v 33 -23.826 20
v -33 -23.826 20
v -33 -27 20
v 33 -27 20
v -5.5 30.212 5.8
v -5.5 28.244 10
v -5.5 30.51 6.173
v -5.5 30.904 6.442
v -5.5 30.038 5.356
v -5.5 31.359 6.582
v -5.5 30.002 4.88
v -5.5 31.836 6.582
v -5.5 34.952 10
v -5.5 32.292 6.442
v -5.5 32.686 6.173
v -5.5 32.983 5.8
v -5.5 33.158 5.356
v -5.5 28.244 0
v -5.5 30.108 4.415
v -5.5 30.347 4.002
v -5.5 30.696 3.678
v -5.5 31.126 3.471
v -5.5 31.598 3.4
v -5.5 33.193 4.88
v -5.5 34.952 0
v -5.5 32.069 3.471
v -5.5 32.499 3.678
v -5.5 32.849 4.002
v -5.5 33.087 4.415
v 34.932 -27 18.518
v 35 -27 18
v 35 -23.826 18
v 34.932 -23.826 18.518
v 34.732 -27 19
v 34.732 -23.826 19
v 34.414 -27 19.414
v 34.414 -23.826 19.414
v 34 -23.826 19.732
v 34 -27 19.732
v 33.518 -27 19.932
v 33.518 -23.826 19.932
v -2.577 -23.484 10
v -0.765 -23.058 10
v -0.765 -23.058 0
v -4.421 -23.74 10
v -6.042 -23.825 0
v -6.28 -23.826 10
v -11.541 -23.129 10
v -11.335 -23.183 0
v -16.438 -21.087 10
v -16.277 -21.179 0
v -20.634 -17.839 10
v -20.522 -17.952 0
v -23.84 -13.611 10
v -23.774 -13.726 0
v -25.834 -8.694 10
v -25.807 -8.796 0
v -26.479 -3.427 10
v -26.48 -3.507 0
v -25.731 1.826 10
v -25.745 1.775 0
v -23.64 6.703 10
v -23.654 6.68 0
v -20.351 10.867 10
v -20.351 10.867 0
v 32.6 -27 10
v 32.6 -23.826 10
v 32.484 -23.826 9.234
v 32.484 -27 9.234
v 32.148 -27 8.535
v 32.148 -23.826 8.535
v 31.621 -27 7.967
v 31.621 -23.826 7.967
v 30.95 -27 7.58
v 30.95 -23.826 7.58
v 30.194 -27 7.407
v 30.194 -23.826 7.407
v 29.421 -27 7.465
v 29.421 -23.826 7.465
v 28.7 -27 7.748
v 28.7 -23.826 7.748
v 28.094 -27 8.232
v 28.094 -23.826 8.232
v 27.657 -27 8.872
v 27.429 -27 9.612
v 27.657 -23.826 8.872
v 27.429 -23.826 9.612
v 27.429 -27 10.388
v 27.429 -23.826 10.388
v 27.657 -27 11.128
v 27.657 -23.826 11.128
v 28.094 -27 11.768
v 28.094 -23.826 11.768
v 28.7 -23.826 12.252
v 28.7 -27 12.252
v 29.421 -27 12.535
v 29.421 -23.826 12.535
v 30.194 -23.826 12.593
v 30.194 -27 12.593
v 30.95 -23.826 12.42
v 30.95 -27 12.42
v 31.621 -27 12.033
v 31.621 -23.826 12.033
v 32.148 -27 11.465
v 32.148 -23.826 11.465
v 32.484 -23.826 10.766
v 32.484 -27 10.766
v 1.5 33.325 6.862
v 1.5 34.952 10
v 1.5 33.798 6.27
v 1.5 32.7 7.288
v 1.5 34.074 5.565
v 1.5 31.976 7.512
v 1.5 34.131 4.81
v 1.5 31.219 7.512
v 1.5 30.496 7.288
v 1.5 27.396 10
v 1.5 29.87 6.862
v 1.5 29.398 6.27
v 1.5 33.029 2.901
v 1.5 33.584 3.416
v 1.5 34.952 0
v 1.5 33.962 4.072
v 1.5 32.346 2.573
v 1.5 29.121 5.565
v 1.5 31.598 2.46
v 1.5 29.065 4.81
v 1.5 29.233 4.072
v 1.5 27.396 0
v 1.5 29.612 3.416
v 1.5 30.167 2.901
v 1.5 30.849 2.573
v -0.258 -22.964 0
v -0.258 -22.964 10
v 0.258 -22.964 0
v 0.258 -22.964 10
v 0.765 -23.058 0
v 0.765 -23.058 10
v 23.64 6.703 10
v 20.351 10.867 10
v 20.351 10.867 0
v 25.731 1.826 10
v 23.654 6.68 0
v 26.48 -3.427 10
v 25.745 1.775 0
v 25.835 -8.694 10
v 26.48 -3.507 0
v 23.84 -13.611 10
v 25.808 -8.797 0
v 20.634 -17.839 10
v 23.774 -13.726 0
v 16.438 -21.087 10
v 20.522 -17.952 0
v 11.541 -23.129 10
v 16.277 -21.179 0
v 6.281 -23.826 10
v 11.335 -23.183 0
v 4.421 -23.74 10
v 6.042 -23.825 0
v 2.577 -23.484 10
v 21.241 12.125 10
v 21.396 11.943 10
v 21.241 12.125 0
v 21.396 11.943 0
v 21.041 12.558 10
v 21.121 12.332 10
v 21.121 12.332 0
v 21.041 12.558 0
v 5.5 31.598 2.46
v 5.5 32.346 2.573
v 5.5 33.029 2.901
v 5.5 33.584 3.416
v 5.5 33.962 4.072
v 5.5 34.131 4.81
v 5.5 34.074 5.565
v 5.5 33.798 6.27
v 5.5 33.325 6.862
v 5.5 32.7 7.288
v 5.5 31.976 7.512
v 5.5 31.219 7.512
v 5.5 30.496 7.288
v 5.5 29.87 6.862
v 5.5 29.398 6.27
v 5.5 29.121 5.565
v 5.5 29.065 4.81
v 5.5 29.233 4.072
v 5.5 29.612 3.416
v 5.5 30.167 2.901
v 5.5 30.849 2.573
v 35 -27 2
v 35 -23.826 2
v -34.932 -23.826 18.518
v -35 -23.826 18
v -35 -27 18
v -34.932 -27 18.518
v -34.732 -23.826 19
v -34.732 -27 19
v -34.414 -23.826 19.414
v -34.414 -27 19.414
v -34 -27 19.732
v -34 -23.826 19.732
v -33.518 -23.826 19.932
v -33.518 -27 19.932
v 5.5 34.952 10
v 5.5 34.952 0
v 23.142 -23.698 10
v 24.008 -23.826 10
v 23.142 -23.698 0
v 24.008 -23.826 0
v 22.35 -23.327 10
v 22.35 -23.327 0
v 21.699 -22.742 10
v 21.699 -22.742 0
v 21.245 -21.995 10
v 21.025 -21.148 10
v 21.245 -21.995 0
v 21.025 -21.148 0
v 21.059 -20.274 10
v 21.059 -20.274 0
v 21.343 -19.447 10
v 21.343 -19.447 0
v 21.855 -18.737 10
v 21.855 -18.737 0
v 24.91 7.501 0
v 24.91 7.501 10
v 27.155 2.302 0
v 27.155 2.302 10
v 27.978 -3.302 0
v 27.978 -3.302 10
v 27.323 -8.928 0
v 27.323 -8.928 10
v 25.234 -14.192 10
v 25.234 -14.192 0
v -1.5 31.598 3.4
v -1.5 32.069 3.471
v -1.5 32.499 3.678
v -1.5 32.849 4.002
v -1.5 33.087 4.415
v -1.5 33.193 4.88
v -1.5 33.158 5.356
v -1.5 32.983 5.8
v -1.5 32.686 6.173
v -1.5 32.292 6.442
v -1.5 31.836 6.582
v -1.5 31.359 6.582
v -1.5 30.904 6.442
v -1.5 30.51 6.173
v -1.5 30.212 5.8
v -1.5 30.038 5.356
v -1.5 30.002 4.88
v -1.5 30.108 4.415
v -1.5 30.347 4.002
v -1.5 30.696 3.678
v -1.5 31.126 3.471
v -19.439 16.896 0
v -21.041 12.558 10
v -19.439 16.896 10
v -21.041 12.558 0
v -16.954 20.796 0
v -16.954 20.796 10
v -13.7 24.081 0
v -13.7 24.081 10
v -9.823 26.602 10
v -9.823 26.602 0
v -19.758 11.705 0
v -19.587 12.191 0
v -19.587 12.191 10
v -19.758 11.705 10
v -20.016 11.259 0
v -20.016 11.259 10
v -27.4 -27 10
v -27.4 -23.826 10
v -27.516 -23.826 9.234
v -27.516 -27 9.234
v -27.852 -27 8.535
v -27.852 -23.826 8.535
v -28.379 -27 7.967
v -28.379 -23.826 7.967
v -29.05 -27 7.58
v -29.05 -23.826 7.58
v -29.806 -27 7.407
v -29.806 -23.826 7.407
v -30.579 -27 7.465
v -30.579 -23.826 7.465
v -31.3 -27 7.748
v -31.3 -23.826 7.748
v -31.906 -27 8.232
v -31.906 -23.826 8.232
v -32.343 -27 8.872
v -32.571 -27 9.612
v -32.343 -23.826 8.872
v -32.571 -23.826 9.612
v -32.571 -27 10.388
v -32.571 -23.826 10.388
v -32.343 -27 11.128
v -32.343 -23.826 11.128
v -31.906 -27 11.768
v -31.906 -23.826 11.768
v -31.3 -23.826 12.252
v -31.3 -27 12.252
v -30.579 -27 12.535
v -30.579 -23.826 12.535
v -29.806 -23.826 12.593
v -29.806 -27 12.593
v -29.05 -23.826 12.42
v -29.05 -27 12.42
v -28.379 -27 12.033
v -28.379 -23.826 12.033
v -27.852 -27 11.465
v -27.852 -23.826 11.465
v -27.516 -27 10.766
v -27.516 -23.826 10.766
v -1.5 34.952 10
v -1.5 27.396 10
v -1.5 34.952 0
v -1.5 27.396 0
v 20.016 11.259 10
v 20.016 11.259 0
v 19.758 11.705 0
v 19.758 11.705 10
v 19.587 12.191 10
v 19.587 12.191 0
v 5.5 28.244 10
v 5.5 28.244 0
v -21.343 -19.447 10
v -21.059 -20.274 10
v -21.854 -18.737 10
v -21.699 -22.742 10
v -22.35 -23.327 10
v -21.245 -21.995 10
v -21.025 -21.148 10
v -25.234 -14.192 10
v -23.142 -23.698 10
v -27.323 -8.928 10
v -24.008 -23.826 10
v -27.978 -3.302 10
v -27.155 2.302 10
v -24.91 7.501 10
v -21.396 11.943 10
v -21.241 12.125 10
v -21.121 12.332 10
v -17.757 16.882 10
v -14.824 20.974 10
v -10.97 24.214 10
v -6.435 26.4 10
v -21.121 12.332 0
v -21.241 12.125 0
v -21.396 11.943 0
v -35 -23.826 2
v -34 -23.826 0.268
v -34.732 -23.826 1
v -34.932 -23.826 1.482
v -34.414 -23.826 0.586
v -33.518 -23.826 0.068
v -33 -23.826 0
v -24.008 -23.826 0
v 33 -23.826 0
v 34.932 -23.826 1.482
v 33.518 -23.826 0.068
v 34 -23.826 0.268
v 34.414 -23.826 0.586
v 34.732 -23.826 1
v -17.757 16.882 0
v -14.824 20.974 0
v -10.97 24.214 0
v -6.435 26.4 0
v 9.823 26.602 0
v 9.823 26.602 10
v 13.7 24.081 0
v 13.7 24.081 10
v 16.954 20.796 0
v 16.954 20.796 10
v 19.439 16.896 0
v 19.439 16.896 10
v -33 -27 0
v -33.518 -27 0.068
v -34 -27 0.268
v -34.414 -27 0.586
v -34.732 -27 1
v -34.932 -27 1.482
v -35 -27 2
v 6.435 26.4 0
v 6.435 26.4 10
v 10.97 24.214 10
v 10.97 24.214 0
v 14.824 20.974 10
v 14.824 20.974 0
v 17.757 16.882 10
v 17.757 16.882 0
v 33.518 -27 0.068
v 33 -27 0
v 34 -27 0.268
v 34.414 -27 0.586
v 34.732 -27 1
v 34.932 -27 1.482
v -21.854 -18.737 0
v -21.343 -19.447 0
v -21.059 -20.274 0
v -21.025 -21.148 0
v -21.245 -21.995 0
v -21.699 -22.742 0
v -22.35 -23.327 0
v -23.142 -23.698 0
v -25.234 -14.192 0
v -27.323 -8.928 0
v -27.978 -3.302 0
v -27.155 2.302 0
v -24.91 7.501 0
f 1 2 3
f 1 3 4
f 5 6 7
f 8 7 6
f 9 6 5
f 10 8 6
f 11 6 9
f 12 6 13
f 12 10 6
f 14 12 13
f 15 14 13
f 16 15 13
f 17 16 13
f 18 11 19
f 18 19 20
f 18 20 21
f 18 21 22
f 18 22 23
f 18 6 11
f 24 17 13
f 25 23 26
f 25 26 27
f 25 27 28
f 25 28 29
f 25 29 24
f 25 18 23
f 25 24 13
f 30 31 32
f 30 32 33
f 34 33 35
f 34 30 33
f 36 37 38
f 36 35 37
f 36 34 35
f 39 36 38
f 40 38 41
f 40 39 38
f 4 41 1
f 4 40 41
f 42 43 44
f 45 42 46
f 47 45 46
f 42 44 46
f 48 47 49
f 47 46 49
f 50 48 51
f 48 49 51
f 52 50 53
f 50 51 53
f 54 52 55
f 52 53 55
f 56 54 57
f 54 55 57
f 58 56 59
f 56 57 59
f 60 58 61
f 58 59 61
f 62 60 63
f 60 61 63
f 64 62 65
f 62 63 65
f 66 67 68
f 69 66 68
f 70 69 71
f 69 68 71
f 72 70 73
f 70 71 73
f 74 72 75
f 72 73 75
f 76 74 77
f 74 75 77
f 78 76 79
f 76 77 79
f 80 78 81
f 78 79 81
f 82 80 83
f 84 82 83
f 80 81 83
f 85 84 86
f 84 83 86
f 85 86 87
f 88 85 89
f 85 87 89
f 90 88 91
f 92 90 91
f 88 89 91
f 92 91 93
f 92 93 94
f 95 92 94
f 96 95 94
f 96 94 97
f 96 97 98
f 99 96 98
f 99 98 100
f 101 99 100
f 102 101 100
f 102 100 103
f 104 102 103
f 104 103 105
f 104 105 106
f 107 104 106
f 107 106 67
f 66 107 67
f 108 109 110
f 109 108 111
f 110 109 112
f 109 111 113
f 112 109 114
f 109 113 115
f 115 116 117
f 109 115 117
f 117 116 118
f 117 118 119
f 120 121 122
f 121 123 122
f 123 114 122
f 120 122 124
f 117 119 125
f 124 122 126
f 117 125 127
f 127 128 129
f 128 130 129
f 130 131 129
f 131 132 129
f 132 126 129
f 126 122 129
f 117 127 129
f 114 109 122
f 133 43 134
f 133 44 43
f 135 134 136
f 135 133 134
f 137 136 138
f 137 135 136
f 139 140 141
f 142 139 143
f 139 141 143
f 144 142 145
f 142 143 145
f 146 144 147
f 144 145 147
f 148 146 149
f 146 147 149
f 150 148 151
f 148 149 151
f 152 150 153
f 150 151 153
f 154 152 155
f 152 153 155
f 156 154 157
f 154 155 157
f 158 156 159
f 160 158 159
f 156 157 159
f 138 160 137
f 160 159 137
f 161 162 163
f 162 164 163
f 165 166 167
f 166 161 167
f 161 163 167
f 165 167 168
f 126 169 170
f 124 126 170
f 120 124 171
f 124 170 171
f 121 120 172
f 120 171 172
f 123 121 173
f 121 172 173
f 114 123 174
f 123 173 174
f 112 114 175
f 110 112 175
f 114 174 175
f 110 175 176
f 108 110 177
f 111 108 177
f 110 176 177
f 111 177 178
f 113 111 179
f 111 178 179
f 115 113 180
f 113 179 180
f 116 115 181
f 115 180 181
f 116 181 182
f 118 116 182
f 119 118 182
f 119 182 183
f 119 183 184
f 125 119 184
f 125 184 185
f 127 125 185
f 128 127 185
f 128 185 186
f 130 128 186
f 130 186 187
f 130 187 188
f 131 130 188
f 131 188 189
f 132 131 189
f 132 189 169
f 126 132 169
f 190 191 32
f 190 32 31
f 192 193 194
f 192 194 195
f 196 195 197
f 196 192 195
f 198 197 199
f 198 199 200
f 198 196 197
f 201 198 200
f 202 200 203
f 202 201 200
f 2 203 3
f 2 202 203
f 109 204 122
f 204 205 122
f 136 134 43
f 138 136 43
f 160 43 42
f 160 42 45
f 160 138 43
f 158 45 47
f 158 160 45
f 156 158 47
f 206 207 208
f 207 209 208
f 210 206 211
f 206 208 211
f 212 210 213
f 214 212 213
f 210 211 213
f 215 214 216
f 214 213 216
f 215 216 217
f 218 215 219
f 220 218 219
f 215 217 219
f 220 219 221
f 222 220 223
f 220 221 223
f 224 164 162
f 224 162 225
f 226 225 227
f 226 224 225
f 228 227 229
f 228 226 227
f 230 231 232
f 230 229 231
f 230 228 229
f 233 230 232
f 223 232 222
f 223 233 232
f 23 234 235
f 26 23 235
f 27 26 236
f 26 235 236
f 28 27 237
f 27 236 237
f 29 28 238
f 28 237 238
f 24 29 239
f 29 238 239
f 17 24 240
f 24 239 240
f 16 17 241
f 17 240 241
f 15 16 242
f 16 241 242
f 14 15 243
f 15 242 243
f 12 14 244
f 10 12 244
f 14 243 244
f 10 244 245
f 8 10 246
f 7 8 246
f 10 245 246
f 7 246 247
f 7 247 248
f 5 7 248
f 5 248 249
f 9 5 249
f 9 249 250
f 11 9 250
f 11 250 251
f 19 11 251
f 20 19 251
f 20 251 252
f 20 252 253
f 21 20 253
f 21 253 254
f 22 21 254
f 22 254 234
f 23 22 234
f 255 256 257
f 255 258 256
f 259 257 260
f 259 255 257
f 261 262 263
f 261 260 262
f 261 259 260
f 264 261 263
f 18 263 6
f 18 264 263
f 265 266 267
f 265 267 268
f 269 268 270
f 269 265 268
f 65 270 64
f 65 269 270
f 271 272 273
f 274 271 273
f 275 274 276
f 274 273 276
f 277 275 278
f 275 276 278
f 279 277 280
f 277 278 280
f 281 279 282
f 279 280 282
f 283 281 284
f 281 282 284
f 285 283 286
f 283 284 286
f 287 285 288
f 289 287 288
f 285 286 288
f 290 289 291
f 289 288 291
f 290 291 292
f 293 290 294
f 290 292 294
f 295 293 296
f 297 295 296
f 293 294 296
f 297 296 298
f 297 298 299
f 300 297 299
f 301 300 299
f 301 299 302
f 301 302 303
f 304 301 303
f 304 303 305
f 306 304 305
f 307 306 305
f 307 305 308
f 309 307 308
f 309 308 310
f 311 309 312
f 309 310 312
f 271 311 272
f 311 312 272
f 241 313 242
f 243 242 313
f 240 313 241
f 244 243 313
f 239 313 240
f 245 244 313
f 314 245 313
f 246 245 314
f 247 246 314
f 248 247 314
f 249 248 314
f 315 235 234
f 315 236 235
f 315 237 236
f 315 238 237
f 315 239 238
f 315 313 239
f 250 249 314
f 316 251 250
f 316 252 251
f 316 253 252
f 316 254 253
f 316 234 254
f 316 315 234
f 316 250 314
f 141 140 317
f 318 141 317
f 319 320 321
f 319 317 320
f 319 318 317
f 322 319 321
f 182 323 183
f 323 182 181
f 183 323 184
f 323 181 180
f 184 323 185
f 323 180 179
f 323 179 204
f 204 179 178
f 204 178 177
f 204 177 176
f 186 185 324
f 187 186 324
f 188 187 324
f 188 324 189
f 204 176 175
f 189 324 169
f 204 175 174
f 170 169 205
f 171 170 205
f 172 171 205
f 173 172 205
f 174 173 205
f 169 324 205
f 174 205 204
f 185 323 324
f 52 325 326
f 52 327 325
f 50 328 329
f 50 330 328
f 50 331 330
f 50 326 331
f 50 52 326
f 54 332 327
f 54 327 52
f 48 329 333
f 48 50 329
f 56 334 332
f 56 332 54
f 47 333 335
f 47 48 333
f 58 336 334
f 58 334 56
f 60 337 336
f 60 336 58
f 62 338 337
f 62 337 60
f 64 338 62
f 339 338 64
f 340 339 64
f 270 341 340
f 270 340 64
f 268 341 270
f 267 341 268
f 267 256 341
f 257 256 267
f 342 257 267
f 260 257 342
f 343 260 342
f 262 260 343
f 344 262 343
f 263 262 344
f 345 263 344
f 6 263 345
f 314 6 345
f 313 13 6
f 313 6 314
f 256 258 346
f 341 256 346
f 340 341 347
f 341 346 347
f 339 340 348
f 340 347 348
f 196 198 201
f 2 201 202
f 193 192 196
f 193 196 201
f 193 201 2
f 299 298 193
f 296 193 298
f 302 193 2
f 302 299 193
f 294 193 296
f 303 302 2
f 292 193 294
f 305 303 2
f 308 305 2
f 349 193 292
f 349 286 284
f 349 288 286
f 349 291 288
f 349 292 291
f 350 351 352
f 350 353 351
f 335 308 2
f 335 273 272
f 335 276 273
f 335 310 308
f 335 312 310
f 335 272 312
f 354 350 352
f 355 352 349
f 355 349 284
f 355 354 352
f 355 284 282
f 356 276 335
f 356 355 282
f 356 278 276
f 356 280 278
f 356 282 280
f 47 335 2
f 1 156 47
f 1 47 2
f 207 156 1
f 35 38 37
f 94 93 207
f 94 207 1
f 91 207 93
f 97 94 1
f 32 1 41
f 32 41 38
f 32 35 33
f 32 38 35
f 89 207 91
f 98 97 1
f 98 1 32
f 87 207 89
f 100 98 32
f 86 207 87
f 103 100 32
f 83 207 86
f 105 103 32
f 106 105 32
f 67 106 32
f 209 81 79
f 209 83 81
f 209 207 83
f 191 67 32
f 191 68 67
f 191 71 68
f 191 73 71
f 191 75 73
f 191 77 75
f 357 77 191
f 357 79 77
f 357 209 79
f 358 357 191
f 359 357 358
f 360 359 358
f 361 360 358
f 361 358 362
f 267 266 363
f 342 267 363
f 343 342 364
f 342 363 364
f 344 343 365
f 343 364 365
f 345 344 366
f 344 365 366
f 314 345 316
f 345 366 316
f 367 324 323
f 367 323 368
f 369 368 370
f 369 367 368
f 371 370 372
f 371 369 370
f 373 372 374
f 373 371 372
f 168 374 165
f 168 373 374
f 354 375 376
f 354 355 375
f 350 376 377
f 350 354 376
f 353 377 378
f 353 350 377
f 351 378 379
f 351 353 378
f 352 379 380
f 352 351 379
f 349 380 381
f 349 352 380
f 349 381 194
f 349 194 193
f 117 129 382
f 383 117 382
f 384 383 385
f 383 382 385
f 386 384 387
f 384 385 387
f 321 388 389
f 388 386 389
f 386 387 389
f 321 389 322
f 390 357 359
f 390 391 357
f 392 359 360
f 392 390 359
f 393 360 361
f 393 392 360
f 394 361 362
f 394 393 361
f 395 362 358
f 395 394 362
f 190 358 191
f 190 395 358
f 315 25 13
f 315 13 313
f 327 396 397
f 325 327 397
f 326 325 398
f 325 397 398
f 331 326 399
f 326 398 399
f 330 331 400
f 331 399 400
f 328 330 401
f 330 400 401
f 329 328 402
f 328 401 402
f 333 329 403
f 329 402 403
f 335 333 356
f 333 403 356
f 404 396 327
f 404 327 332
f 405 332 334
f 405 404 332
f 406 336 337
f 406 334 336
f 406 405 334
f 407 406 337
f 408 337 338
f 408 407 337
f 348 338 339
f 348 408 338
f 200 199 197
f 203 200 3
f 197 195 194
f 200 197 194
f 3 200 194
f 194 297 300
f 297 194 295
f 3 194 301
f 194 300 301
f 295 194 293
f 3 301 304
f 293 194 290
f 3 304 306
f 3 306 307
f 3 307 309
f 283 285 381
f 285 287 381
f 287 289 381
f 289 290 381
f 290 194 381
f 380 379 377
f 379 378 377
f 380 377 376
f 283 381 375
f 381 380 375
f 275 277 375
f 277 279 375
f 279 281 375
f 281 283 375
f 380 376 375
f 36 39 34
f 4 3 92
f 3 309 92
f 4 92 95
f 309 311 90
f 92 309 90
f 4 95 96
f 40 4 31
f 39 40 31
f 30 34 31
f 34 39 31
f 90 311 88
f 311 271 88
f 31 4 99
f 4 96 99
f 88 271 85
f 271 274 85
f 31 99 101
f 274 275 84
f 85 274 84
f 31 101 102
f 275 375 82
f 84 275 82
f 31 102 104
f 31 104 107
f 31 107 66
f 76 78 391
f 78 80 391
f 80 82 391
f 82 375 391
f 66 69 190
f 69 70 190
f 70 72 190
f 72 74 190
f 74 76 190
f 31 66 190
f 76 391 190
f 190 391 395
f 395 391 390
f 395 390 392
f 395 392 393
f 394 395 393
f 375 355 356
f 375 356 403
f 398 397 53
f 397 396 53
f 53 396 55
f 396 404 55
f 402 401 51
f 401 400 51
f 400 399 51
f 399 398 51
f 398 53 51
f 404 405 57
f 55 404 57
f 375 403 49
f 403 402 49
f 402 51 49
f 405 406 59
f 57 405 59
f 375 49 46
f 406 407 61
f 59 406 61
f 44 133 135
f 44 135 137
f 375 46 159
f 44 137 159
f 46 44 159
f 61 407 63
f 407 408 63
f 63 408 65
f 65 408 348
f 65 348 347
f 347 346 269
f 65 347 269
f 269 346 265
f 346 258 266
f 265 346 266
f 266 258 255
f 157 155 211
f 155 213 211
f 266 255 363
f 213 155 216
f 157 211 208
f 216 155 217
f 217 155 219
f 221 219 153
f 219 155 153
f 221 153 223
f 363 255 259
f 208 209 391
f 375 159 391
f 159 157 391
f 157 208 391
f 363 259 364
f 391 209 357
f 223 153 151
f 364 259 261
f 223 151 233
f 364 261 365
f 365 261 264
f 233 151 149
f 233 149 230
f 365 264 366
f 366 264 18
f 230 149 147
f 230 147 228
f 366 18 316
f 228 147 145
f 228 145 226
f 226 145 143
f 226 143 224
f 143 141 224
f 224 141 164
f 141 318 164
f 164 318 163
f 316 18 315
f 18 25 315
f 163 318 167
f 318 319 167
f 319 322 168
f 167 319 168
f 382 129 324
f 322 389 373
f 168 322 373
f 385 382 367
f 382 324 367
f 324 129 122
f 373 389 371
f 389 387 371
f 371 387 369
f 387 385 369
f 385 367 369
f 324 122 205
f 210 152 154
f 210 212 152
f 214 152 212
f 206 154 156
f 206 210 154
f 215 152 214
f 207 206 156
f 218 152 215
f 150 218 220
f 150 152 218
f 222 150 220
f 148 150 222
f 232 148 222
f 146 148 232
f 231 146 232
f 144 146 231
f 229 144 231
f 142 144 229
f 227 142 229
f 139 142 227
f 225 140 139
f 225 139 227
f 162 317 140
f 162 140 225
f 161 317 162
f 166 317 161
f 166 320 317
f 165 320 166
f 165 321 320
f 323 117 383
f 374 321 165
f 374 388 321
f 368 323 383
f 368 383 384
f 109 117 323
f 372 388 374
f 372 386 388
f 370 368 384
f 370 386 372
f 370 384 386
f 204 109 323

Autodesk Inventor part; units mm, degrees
ref_plane "YZ Plane" through (0, 0, 0) normal (1, 0, 0) x (0, 1, 0)
ref_plane "XZ Plane" through (0, 0, 0) normal (0, 1, 0) x (-1, 0, 0)
ref_plane "XY Plane" through (0, 0, 0) normal (0, 0, 1) x (1, 0, 0)
sketch "Block1" plane through (0, 0, 0) normal (0, 0, 1) x (1, 0, 0)
  arc A0 (0.8192, -22.866) -> (-0.8192, -22.866) centre (0, -25.7519) ccw construction
  arc A1 (-20.2121, 10.7235) -> (-19.3929, 12.1424) centre (-22.3018, 12.876) ccw construction
  circle A2 centre (21.4359, -12.376) radius 1.25 construction
  circle A3 centre (22.4424, 3.0852) radius 1.25 construction
  arc A4 (0.8192, -22.866) -> (20.2121, 10.7235) centre (6.2805, -3.626) ccw construction
  circle A5 centre (-8.5493, -20.9783) radius 1.25 construction
  circle A6 centre (8.5493, -20.9783) radius 1.25 construction
  circle A7 centre (-22.4424, 3.0852) radius 1.25 construction
  arc A8 (-20.2121, 10.7235) -> (-0.8192, -22.866) centre (-6.2805, -3.626) ccw construction
  circle A9 centre (-21.4359, -12.376) radius 1.25 construction
  arc A10 (19.3929, 12.1424) -> (20.2121, 10.7235) centre (22.3018, 12.876) ccw construction
  arc A11 (19.3929, 12.1424) -> (-19.3929, 12.1424) centre (0, 7.2521) ccw construction
  circle A12 centre (-13.8931, 17.8931) radius 1.25 construction
  circle A13 centre (13.8931, 17.8931) radius 1.25 construction
  circle A14 centre (0, 24.7521) radius 1.25 construction
  arc A15 (19.5868, 12.1913) -> (-19.5868, 12.1913) centre (0, 7.2521) ccw
  arc A16 (19.5868, 12.1913) -> (20.3514, 10.867) centre (22.3018, 12.876) ccw
  arc A17 (0.7646, -23.0584) -> (20.3514, 10.867) centre (6.2805, -3.626) ccw
  arc A18 (0.7646, -23.0584) -> (-0.7646, -23.0584) centre (0, -25.7519) ccw
  arc A19 (-20.3514, 10.867) -> (-0.7646, -23.0584) centre (-6.2805, -3.626) ccw
  arc A20 (-20.3514, 10.867) -> (-19.5868, 12.1913) centre (-22.3018, 12.876) ccw
  arc A21 (0.355, -24.5013) -> (-0.355, -24.5013) centre (0, -25.7519) ccw
  arc A22 (0.355, -24.5013) -> (21.3963, 11.9432) centre (6.2805, -3.626) ccw
  arc A23 (21.0413, 12.5581) -> (21.3963, 11.9432) centre (22.3018, 12.876) ccw
  arc A24 (21.0413, 12.5581) -> (-21.0413, 12.5581) centre (0, 7.2521) ccw
  arc A25 (-21.3963, 11.9432) -> (-21.0413, 12.5581) centre (-22.3018, 12.876) ccw
  arc A26 (-21.3963, 11.9432) -> (-0.355, -24.5013) centre (-6.2805, -3.626) ccw
  line L0 (-5.5, 28.2435) -> (-5.5, 34.9521)
  line L1 (-5.5, 34.9521) -> (-1.5, 34.9521)
  line L2 (-1.5, 34.9521) -> (-1.5, 27.3963)
  line L3 (0, 24.7521) -> (0, 36.4403) construction
  line L4 (5.5, 28.2435) -> (5.5, 34.9521)
  line L5 (5.5, 34.9521) -> (1.5, 34.9521)
  line L6 (1.5, 34.9521) -> (1.5, 27.3963)
  point P0 (0, 0)
  dimension "d0" = 0.2
  dimension "d1" = 1.5
  dimension "d2" = 1.5
  dimension "d3" = 4
  dimension "d4" = 6
sketch "Sketch2" plane through (0, 0, 0) normal (0, 0, 1) x (1, 0, 0)
  line L0 (-6.2805, -3.626) -> (0, 7.2521) construction
  line L1 (0, 7.2521) -> (6.2805, -3.626) construction
  line L2 (6.2805, -3.626) -> (-6.2805, -3.626) construction
  line L3 (-3.1402, 1.813) -> (0, 0) construction
  line L4 (0, 0) -> (3.1402, 1.813) construction
  line L5 (0, 0) -> (0, -3.626) construction
  arc A0 (0.8192, -22.866) -> (-0.8192, -22.866) centre (0, -25.7519) ccw construction
  arc A1 (-20.2121, 10.7235) -> (-19.3929, 12.1424) centre (-22.3018, 12.876) ccw construction
  circle A2 centre (21.4359, -12.376) radius 1.25 construction
  circle A3 centre (22.4424, 3.0852) radius 1.25 construction
  arc A4 (0.8192, -22.866) -> (20.2121, 10.7235) centre (6.2805, -3.626) ccw construction
  circle A5 centre (-8.5493, -20.9783) radius 1.25 construction
  circle A6 centre (8.5493, -20.9783) radius 1.25 construction
  circle A7 centre (-22.4424, 3.0852) radius 1.25 construction
  arc A8 (-20.2121, 10.7235) -> (-0.8192, -22.866) centre (-6.2805, -3.626) ccw construction
  circle A9 centre (-21.4359, -12.376) radius 1.25 construction
  arc A10 (19.3929, 12.1424) -> (20.2121, 10.7235) centre (22.3018, 12.876) ccw construction
  arc A11 (19.3929, 12.1424) -> (-19.3929, 12.1424) centre (0, 7.2521) ccw construction
  circle A12 centre (-13.8931, 17.8931) radius 1.25 construction
  circle A13 centre (13.8931, 17.8931) radius 1.25 construction
  circle A14 centre (0, 24.7521) radius 1.25 construction
  arc A15 (19.5868, 12.1913) -> (-19.5868, 12.1913) centre (0, 7.2521) ccw
  arc A16 (19.5868, 12.1913) -> (20.3514, 10.867) centre (22.3018, 12.876) ccw
  arc A17 (0.7646, -23.0584) -> (20.3514, 10.867) centre (6.2805, -3.626) ccw
  arc A18 (0.7646, -23.0584) -> (-0.7646, -23.0584) centre (0, -25.7519) ccw
  arc A19 (-20.3514, 10.867) -> (-0.7646, -23.0584) centre (-6.2805, -3.626) ccw
  arc A20 (-20.3514, 10.867) -> (-19.5868, 12.1913) centre (-22.3018, 12.876) ccw
  arc A21 (0.355, -24.5013) -> (-0.355, -24.5013) centre (0, -25.7519) ccw
  arc A22 (0.355, -24.5013) -> (21.3963, 11.9432) centre (6.2805, -3.626) ccw
  arc A23 (21.0413, 12.5581) -> (21.3963, 11.9432) centre (22.3018, 12.876) ccw
  arc A24 (21.0413, 12.5581) -> (-21.0413, 12.5581) centre (0, 7.2521) ccw
  arc A25 (-21.3963, 11.9432) -> (-21.0413, 12.5581) centre (-22.3018, 12.876) ccw
  arc A26 (-21.3963, 11.9432) -> (-0.355, -24.5013) centre (-6.2805, -3.626) ccw
  line L6 (-5.5, 28.2435) -> (-5.5, 34.9521)
  line L7 (-5.5, 34.9521) -> (-1.5, 34.9521)
  line L8 (-1.5, 34.9521) -> (-1.5, 27.3963)
  line L9 (0, 24.7521) -> (0, 36.4403) construction
  line L10 (5.5, 28.2435) -> (5.5, 34.9521)
  line L11 (5.5, 34.9521) -> (1.5, 34.9521)
  line L12 (1.5, 34.9521) -> (1.5, 27.3963)
extrude "Extrusion1" add sketch "Sketch2" along normal blind 10 contours A15 L12 A24 A23 A22 A21 A26 A25 L8 A20 A19 A18 A17 A16 | L12 L11 L10 A24 | A24 L6 L7 L8
sketch "Sketch3" plane through (5.5, 28.2435, 0) normal (1, 0, 0) x (0, 0, -1)
  line L0 (0, 6.7086) -> (-10, 6.7086) construction
  line L1 (-5, 6.7086) -> (-5, 0) construction
  line L2 (0, 0) -> (-10, 0) construction
  circle A0 centre (-5, 3.3543) radius 1.6
  point P0 (0, -28.2435)
  dimension "d7" = 3.2
extrude "Extrusion2" cut sketch "Sketch3" against normal through all
sketch "Sketch4" plane through (0, 0, 10) normal (0, 0, 1) x (1, 0, 0)
  line L0 (35, -27) -> (-35, -27)
  line L1 (-35, -27) -> (-35, -23.826)
  line L2 (-35, -23.826) -> (35, -23.826)
  line L3 (35, -23.826) -> (35, -27)
  arc A0 (-20.3514, 10.867) -> (-0.7646, -23.0584) centre (-6.2805, -3.626) ccw construction
  arc A1 (0.355, -24.5013) -> (-0.355, -24.5013) centre (0, -25.7519) ccw projected
  line L4 (0, -25.7519) -> (0, -23.826) construction
  point P0 (0, 0)
  dimension "d11" = 35
  dimension "d12" = 35
  dimension "d26" = 27
extrude "Extrusion3" add sketch "Sketch4" against normal up to surface (10 mm away)
fillet "Fillet1" radius 3 2 edges at (-14.2083, -23.826, 5) (14.2083, -23.826, 5)
sketch "Sketch6" plane through (0, 0, 10) normal (0, 0, 1) x (1, 0, 0)
  line L0 (-35, -27) -> (35, -27) projected
  line L1 (-35, -23.826) -> (-24.0076, -23.826) projected
  line L2 (35, -27) -> (-35, -27)
  line L3 (-35, -27) -> (-35, -23.826)
  line L4 (-35, -23.826) -> (35, -23.826)
  line L5 (35, -23.826) -> (35, -27)
  point P0 (0, 0)
extrude "Extrusion5" add sketch "Sketch6" along normal blind 10
sketch "Sketch5" plane through (35, -23.826, 10) normal (0, 1, 0) x (1, 0, 0)
  line L0 (0, 0) -> (-5, 0) construction
  circle A0 centre (-5, 0) radius 2.6
  line L1 (-70, 0) -> (-65, 0) construction
  circle A1 centre (-65, 0) radius 2.6
  line L2 (0, 10) -> (0, -10) projected
  line L3 (-70, -10) -> (-70, 10) projected
  point P0 (-35, 10)
  dimension "d16" = 5
  dimension "d17" = 5.2
extrude "Extrusion4" cut sketch "Sketch5" against normal blind 10
fillet "Fillet2" radius 2 4 edges at (35, -25.413, 0) (-35, -25.413, 0) (-35, -25.413, 20) (35, -25.413, 20)
sketch "Sketch7" plane through (5.5, 28.2435, 0) normal (1, 0, 0) x (0, 0, -1)
  circle A0 centre (-5, 3.3543) radius 1.6 projected
  circle A1 centre (-5, 3.3543) radius 2.54
  point P0 (0, -28.2435)
  dimension "d23" = 5.08
extrude "Extrusion6" cut sketch "Sketch7" against normal up to surface (4 mm away) contours A0 | A1
equation "\"d12\" = d11"
properties part number "MotorTestBracket"
